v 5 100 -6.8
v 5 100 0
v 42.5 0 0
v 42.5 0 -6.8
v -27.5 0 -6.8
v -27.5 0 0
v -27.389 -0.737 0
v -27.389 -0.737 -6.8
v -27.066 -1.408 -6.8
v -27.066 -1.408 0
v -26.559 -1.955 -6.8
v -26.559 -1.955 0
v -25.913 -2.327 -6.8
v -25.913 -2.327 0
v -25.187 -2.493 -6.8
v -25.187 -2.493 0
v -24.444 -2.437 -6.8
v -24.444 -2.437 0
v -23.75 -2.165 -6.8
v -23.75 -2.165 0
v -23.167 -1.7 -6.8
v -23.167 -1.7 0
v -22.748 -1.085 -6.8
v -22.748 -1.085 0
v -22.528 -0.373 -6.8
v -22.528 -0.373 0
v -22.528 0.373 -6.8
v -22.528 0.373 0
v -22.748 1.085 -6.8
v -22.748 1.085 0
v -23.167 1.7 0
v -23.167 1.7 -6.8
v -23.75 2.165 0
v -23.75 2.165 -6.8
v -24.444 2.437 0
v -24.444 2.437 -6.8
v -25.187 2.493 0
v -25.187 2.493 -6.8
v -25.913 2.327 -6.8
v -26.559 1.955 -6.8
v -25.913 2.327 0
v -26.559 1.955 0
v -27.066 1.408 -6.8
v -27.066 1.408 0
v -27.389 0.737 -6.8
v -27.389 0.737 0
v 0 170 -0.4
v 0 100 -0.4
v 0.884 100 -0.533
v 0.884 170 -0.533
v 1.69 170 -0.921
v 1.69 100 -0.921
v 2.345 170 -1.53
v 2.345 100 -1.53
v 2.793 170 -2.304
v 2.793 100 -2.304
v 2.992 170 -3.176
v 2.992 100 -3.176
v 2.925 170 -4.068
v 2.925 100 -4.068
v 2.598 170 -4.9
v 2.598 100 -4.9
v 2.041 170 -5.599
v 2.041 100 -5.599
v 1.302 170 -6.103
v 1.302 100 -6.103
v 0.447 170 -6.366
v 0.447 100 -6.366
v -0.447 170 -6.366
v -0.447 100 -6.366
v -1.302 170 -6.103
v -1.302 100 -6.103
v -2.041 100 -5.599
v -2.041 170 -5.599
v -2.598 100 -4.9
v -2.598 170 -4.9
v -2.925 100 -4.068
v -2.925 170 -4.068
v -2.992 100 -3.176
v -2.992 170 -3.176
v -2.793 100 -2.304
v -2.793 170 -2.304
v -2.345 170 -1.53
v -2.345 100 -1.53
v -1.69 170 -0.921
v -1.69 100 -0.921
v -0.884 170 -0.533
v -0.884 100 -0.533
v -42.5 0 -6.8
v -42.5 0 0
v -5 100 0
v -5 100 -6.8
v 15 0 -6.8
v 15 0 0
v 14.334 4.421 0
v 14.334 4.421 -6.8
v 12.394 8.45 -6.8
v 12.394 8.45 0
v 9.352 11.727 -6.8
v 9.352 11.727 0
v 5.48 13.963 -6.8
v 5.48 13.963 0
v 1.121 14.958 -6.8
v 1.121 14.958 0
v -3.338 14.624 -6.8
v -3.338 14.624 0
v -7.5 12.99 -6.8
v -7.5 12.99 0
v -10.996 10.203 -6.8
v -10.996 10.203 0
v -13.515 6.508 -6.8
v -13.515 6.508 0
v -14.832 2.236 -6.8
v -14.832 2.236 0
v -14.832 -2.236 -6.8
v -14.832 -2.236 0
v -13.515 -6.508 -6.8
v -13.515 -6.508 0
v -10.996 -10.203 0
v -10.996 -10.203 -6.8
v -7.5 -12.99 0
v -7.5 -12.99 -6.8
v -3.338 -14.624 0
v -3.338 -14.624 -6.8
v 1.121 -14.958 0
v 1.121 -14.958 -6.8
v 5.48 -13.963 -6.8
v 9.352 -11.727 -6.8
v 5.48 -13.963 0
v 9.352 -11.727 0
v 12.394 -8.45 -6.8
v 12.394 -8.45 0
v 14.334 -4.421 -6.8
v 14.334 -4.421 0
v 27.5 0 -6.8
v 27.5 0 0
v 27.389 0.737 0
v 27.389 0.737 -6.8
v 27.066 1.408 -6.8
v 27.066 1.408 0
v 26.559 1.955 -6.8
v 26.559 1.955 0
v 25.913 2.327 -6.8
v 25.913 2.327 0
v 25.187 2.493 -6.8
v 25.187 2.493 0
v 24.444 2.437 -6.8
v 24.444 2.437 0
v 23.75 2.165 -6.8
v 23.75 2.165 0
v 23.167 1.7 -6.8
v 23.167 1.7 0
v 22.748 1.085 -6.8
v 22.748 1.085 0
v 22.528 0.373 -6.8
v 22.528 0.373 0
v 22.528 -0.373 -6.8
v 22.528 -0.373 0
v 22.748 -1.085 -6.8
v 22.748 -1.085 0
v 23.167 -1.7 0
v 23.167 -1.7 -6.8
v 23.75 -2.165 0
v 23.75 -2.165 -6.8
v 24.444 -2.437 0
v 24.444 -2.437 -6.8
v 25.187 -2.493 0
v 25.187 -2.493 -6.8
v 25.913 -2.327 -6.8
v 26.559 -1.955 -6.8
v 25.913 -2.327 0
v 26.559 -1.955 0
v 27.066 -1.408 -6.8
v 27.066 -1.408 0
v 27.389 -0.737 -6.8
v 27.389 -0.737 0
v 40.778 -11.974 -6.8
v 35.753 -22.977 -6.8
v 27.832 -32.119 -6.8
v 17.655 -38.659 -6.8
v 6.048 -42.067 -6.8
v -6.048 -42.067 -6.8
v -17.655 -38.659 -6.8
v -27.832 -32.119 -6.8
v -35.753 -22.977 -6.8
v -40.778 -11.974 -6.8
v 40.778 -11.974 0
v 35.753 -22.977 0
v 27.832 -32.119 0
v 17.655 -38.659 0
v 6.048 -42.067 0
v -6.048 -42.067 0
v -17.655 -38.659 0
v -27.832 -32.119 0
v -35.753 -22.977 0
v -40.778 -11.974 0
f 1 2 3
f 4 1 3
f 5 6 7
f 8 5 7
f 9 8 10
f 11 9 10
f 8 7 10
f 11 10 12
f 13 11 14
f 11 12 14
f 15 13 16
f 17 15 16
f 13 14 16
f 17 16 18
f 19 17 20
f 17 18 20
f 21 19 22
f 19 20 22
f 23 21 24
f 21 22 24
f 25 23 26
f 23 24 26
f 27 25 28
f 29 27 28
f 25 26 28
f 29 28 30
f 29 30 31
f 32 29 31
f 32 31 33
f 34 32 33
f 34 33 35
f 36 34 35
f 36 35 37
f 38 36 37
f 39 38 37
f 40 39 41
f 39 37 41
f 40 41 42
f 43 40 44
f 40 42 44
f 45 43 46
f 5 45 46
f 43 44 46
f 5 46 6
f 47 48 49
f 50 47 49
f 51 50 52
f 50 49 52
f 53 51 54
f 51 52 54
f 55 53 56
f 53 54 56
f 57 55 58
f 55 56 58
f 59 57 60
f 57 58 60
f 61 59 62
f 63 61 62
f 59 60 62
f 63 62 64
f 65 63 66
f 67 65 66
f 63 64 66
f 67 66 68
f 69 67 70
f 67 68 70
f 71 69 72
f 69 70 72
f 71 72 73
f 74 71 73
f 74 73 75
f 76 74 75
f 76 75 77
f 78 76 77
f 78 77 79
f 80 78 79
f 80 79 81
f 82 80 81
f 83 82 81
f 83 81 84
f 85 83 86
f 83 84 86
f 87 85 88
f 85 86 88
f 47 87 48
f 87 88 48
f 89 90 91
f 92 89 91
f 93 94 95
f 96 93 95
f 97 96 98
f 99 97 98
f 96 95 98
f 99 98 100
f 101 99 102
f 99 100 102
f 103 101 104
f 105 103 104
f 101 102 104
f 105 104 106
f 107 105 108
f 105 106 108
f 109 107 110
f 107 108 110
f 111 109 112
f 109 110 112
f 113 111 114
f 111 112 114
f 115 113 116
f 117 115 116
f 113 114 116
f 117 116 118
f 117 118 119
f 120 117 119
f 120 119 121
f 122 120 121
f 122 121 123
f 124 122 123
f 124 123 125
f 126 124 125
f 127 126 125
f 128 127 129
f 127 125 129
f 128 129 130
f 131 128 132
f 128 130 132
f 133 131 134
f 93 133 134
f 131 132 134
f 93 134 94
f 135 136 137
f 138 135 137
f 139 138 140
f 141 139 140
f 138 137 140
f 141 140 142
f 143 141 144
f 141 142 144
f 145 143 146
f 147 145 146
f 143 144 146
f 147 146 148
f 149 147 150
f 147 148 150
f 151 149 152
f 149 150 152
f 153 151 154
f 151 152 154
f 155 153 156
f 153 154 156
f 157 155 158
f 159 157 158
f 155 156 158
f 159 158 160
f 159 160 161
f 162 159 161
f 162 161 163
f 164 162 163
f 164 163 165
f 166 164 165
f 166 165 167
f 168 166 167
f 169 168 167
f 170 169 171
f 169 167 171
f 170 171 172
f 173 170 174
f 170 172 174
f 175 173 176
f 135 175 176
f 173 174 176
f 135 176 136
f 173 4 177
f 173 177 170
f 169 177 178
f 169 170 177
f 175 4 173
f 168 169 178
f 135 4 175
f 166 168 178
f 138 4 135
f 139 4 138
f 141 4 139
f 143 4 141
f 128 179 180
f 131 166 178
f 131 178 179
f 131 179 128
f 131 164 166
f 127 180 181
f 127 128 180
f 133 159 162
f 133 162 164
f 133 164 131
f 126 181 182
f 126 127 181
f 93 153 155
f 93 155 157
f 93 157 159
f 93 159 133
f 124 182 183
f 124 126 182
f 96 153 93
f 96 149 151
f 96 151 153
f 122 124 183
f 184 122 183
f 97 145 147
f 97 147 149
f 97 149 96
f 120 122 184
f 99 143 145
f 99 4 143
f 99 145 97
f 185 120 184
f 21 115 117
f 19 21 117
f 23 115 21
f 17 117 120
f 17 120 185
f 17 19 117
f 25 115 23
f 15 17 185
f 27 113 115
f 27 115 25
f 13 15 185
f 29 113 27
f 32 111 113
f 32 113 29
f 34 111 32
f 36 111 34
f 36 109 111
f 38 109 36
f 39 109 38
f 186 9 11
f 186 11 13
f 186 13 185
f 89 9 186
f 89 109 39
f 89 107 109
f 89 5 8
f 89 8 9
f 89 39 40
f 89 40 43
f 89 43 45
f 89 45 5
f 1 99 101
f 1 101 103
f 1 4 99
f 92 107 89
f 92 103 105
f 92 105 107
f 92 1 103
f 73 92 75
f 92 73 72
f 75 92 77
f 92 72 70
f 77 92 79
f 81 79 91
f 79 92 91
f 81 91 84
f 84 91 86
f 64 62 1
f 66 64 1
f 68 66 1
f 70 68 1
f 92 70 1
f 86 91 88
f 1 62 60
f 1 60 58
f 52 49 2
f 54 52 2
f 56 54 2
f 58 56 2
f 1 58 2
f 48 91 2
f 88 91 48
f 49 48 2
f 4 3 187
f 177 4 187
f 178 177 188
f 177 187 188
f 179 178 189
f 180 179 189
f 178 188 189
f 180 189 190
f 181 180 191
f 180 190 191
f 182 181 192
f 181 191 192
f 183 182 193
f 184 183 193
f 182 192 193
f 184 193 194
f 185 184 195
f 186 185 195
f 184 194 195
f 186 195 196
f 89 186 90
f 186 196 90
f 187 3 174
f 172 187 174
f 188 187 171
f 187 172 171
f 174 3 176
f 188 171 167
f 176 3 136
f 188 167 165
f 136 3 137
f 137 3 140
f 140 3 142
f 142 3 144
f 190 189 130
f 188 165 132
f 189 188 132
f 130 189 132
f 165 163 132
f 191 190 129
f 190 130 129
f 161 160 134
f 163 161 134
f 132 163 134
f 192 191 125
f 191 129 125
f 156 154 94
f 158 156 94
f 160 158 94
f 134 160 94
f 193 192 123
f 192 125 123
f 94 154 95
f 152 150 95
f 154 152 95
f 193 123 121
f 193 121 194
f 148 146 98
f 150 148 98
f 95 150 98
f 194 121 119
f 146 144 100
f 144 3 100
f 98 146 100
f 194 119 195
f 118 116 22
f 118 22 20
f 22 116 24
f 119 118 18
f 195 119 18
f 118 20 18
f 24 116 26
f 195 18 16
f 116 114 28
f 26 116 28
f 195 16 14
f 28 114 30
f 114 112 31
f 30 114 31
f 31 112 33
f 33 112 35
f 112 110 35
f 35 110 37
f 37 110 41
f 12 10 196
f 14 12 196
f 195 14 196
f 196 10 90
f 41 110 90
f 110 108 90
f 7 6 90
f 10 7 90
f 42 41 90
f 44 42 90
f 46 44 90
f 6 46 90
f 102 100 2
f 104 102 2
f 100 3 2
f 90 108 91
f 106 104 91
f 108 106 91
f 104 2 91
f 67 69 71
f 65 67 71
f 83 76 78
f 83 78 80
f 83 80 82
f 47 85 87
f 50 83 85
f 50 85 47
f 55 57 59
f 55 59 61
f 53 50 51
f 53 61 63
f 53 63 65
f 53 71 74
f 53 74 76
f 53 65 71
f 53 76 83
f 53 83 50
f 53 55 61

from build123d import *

# Parameters (mm, degrees)
SKETCH1_R           = 15
SKETCH1_R_2         = 2.5
BASE_FLANGE1_DEPTH  = 6.8
SKETCH6_R           = 3
BOSS_EXTRUDE1_DEPTH = 70


# Sheet-metal steps are written as plain solids
with BuildPart() as part:
    # Sketch1 → Base-Flange1 (new body)
    with BuildSketch(Plane.XY):
        with BuildLine():
            Line((-42.5, 0), (-5, 100))
            Line((-5, 100), (5, 100))
            Line((5, 100), (42.5, 0))
            ThreePointArc((42.5, 0), (0, -42.5), (-42.5, 0))
        make_face()
        Circle(SKETCH1_R, mode=Mode.SUBTRACT)
        with Locations((25, 0)):
            Circle(SKETCH1_R_2, mode=Mode.SUBTRACT)
        with Locations(Location((-25, 0, 0), (0, 0, 180))):
            Circle(SKETCH1_R_2, mode=Mode.SUBTRACT)
    extrude(amount=-BASE_FLANGE1_DEPTH)

    # Sketch6 → Boss-Extrude1 (add)
    with BuildSketch(Plane(origin=(0, 100, 0), x_dir=(1, 0, 0), z_dir=(0, 1, 0))):
        with Locations(Location((0, 3.4, 0), (0, 0, 270))):
            Circle(SKETCH6_R)
    extrude(amount=BOSS_EXTRUDE1_DEPTH)


solid = part.part
